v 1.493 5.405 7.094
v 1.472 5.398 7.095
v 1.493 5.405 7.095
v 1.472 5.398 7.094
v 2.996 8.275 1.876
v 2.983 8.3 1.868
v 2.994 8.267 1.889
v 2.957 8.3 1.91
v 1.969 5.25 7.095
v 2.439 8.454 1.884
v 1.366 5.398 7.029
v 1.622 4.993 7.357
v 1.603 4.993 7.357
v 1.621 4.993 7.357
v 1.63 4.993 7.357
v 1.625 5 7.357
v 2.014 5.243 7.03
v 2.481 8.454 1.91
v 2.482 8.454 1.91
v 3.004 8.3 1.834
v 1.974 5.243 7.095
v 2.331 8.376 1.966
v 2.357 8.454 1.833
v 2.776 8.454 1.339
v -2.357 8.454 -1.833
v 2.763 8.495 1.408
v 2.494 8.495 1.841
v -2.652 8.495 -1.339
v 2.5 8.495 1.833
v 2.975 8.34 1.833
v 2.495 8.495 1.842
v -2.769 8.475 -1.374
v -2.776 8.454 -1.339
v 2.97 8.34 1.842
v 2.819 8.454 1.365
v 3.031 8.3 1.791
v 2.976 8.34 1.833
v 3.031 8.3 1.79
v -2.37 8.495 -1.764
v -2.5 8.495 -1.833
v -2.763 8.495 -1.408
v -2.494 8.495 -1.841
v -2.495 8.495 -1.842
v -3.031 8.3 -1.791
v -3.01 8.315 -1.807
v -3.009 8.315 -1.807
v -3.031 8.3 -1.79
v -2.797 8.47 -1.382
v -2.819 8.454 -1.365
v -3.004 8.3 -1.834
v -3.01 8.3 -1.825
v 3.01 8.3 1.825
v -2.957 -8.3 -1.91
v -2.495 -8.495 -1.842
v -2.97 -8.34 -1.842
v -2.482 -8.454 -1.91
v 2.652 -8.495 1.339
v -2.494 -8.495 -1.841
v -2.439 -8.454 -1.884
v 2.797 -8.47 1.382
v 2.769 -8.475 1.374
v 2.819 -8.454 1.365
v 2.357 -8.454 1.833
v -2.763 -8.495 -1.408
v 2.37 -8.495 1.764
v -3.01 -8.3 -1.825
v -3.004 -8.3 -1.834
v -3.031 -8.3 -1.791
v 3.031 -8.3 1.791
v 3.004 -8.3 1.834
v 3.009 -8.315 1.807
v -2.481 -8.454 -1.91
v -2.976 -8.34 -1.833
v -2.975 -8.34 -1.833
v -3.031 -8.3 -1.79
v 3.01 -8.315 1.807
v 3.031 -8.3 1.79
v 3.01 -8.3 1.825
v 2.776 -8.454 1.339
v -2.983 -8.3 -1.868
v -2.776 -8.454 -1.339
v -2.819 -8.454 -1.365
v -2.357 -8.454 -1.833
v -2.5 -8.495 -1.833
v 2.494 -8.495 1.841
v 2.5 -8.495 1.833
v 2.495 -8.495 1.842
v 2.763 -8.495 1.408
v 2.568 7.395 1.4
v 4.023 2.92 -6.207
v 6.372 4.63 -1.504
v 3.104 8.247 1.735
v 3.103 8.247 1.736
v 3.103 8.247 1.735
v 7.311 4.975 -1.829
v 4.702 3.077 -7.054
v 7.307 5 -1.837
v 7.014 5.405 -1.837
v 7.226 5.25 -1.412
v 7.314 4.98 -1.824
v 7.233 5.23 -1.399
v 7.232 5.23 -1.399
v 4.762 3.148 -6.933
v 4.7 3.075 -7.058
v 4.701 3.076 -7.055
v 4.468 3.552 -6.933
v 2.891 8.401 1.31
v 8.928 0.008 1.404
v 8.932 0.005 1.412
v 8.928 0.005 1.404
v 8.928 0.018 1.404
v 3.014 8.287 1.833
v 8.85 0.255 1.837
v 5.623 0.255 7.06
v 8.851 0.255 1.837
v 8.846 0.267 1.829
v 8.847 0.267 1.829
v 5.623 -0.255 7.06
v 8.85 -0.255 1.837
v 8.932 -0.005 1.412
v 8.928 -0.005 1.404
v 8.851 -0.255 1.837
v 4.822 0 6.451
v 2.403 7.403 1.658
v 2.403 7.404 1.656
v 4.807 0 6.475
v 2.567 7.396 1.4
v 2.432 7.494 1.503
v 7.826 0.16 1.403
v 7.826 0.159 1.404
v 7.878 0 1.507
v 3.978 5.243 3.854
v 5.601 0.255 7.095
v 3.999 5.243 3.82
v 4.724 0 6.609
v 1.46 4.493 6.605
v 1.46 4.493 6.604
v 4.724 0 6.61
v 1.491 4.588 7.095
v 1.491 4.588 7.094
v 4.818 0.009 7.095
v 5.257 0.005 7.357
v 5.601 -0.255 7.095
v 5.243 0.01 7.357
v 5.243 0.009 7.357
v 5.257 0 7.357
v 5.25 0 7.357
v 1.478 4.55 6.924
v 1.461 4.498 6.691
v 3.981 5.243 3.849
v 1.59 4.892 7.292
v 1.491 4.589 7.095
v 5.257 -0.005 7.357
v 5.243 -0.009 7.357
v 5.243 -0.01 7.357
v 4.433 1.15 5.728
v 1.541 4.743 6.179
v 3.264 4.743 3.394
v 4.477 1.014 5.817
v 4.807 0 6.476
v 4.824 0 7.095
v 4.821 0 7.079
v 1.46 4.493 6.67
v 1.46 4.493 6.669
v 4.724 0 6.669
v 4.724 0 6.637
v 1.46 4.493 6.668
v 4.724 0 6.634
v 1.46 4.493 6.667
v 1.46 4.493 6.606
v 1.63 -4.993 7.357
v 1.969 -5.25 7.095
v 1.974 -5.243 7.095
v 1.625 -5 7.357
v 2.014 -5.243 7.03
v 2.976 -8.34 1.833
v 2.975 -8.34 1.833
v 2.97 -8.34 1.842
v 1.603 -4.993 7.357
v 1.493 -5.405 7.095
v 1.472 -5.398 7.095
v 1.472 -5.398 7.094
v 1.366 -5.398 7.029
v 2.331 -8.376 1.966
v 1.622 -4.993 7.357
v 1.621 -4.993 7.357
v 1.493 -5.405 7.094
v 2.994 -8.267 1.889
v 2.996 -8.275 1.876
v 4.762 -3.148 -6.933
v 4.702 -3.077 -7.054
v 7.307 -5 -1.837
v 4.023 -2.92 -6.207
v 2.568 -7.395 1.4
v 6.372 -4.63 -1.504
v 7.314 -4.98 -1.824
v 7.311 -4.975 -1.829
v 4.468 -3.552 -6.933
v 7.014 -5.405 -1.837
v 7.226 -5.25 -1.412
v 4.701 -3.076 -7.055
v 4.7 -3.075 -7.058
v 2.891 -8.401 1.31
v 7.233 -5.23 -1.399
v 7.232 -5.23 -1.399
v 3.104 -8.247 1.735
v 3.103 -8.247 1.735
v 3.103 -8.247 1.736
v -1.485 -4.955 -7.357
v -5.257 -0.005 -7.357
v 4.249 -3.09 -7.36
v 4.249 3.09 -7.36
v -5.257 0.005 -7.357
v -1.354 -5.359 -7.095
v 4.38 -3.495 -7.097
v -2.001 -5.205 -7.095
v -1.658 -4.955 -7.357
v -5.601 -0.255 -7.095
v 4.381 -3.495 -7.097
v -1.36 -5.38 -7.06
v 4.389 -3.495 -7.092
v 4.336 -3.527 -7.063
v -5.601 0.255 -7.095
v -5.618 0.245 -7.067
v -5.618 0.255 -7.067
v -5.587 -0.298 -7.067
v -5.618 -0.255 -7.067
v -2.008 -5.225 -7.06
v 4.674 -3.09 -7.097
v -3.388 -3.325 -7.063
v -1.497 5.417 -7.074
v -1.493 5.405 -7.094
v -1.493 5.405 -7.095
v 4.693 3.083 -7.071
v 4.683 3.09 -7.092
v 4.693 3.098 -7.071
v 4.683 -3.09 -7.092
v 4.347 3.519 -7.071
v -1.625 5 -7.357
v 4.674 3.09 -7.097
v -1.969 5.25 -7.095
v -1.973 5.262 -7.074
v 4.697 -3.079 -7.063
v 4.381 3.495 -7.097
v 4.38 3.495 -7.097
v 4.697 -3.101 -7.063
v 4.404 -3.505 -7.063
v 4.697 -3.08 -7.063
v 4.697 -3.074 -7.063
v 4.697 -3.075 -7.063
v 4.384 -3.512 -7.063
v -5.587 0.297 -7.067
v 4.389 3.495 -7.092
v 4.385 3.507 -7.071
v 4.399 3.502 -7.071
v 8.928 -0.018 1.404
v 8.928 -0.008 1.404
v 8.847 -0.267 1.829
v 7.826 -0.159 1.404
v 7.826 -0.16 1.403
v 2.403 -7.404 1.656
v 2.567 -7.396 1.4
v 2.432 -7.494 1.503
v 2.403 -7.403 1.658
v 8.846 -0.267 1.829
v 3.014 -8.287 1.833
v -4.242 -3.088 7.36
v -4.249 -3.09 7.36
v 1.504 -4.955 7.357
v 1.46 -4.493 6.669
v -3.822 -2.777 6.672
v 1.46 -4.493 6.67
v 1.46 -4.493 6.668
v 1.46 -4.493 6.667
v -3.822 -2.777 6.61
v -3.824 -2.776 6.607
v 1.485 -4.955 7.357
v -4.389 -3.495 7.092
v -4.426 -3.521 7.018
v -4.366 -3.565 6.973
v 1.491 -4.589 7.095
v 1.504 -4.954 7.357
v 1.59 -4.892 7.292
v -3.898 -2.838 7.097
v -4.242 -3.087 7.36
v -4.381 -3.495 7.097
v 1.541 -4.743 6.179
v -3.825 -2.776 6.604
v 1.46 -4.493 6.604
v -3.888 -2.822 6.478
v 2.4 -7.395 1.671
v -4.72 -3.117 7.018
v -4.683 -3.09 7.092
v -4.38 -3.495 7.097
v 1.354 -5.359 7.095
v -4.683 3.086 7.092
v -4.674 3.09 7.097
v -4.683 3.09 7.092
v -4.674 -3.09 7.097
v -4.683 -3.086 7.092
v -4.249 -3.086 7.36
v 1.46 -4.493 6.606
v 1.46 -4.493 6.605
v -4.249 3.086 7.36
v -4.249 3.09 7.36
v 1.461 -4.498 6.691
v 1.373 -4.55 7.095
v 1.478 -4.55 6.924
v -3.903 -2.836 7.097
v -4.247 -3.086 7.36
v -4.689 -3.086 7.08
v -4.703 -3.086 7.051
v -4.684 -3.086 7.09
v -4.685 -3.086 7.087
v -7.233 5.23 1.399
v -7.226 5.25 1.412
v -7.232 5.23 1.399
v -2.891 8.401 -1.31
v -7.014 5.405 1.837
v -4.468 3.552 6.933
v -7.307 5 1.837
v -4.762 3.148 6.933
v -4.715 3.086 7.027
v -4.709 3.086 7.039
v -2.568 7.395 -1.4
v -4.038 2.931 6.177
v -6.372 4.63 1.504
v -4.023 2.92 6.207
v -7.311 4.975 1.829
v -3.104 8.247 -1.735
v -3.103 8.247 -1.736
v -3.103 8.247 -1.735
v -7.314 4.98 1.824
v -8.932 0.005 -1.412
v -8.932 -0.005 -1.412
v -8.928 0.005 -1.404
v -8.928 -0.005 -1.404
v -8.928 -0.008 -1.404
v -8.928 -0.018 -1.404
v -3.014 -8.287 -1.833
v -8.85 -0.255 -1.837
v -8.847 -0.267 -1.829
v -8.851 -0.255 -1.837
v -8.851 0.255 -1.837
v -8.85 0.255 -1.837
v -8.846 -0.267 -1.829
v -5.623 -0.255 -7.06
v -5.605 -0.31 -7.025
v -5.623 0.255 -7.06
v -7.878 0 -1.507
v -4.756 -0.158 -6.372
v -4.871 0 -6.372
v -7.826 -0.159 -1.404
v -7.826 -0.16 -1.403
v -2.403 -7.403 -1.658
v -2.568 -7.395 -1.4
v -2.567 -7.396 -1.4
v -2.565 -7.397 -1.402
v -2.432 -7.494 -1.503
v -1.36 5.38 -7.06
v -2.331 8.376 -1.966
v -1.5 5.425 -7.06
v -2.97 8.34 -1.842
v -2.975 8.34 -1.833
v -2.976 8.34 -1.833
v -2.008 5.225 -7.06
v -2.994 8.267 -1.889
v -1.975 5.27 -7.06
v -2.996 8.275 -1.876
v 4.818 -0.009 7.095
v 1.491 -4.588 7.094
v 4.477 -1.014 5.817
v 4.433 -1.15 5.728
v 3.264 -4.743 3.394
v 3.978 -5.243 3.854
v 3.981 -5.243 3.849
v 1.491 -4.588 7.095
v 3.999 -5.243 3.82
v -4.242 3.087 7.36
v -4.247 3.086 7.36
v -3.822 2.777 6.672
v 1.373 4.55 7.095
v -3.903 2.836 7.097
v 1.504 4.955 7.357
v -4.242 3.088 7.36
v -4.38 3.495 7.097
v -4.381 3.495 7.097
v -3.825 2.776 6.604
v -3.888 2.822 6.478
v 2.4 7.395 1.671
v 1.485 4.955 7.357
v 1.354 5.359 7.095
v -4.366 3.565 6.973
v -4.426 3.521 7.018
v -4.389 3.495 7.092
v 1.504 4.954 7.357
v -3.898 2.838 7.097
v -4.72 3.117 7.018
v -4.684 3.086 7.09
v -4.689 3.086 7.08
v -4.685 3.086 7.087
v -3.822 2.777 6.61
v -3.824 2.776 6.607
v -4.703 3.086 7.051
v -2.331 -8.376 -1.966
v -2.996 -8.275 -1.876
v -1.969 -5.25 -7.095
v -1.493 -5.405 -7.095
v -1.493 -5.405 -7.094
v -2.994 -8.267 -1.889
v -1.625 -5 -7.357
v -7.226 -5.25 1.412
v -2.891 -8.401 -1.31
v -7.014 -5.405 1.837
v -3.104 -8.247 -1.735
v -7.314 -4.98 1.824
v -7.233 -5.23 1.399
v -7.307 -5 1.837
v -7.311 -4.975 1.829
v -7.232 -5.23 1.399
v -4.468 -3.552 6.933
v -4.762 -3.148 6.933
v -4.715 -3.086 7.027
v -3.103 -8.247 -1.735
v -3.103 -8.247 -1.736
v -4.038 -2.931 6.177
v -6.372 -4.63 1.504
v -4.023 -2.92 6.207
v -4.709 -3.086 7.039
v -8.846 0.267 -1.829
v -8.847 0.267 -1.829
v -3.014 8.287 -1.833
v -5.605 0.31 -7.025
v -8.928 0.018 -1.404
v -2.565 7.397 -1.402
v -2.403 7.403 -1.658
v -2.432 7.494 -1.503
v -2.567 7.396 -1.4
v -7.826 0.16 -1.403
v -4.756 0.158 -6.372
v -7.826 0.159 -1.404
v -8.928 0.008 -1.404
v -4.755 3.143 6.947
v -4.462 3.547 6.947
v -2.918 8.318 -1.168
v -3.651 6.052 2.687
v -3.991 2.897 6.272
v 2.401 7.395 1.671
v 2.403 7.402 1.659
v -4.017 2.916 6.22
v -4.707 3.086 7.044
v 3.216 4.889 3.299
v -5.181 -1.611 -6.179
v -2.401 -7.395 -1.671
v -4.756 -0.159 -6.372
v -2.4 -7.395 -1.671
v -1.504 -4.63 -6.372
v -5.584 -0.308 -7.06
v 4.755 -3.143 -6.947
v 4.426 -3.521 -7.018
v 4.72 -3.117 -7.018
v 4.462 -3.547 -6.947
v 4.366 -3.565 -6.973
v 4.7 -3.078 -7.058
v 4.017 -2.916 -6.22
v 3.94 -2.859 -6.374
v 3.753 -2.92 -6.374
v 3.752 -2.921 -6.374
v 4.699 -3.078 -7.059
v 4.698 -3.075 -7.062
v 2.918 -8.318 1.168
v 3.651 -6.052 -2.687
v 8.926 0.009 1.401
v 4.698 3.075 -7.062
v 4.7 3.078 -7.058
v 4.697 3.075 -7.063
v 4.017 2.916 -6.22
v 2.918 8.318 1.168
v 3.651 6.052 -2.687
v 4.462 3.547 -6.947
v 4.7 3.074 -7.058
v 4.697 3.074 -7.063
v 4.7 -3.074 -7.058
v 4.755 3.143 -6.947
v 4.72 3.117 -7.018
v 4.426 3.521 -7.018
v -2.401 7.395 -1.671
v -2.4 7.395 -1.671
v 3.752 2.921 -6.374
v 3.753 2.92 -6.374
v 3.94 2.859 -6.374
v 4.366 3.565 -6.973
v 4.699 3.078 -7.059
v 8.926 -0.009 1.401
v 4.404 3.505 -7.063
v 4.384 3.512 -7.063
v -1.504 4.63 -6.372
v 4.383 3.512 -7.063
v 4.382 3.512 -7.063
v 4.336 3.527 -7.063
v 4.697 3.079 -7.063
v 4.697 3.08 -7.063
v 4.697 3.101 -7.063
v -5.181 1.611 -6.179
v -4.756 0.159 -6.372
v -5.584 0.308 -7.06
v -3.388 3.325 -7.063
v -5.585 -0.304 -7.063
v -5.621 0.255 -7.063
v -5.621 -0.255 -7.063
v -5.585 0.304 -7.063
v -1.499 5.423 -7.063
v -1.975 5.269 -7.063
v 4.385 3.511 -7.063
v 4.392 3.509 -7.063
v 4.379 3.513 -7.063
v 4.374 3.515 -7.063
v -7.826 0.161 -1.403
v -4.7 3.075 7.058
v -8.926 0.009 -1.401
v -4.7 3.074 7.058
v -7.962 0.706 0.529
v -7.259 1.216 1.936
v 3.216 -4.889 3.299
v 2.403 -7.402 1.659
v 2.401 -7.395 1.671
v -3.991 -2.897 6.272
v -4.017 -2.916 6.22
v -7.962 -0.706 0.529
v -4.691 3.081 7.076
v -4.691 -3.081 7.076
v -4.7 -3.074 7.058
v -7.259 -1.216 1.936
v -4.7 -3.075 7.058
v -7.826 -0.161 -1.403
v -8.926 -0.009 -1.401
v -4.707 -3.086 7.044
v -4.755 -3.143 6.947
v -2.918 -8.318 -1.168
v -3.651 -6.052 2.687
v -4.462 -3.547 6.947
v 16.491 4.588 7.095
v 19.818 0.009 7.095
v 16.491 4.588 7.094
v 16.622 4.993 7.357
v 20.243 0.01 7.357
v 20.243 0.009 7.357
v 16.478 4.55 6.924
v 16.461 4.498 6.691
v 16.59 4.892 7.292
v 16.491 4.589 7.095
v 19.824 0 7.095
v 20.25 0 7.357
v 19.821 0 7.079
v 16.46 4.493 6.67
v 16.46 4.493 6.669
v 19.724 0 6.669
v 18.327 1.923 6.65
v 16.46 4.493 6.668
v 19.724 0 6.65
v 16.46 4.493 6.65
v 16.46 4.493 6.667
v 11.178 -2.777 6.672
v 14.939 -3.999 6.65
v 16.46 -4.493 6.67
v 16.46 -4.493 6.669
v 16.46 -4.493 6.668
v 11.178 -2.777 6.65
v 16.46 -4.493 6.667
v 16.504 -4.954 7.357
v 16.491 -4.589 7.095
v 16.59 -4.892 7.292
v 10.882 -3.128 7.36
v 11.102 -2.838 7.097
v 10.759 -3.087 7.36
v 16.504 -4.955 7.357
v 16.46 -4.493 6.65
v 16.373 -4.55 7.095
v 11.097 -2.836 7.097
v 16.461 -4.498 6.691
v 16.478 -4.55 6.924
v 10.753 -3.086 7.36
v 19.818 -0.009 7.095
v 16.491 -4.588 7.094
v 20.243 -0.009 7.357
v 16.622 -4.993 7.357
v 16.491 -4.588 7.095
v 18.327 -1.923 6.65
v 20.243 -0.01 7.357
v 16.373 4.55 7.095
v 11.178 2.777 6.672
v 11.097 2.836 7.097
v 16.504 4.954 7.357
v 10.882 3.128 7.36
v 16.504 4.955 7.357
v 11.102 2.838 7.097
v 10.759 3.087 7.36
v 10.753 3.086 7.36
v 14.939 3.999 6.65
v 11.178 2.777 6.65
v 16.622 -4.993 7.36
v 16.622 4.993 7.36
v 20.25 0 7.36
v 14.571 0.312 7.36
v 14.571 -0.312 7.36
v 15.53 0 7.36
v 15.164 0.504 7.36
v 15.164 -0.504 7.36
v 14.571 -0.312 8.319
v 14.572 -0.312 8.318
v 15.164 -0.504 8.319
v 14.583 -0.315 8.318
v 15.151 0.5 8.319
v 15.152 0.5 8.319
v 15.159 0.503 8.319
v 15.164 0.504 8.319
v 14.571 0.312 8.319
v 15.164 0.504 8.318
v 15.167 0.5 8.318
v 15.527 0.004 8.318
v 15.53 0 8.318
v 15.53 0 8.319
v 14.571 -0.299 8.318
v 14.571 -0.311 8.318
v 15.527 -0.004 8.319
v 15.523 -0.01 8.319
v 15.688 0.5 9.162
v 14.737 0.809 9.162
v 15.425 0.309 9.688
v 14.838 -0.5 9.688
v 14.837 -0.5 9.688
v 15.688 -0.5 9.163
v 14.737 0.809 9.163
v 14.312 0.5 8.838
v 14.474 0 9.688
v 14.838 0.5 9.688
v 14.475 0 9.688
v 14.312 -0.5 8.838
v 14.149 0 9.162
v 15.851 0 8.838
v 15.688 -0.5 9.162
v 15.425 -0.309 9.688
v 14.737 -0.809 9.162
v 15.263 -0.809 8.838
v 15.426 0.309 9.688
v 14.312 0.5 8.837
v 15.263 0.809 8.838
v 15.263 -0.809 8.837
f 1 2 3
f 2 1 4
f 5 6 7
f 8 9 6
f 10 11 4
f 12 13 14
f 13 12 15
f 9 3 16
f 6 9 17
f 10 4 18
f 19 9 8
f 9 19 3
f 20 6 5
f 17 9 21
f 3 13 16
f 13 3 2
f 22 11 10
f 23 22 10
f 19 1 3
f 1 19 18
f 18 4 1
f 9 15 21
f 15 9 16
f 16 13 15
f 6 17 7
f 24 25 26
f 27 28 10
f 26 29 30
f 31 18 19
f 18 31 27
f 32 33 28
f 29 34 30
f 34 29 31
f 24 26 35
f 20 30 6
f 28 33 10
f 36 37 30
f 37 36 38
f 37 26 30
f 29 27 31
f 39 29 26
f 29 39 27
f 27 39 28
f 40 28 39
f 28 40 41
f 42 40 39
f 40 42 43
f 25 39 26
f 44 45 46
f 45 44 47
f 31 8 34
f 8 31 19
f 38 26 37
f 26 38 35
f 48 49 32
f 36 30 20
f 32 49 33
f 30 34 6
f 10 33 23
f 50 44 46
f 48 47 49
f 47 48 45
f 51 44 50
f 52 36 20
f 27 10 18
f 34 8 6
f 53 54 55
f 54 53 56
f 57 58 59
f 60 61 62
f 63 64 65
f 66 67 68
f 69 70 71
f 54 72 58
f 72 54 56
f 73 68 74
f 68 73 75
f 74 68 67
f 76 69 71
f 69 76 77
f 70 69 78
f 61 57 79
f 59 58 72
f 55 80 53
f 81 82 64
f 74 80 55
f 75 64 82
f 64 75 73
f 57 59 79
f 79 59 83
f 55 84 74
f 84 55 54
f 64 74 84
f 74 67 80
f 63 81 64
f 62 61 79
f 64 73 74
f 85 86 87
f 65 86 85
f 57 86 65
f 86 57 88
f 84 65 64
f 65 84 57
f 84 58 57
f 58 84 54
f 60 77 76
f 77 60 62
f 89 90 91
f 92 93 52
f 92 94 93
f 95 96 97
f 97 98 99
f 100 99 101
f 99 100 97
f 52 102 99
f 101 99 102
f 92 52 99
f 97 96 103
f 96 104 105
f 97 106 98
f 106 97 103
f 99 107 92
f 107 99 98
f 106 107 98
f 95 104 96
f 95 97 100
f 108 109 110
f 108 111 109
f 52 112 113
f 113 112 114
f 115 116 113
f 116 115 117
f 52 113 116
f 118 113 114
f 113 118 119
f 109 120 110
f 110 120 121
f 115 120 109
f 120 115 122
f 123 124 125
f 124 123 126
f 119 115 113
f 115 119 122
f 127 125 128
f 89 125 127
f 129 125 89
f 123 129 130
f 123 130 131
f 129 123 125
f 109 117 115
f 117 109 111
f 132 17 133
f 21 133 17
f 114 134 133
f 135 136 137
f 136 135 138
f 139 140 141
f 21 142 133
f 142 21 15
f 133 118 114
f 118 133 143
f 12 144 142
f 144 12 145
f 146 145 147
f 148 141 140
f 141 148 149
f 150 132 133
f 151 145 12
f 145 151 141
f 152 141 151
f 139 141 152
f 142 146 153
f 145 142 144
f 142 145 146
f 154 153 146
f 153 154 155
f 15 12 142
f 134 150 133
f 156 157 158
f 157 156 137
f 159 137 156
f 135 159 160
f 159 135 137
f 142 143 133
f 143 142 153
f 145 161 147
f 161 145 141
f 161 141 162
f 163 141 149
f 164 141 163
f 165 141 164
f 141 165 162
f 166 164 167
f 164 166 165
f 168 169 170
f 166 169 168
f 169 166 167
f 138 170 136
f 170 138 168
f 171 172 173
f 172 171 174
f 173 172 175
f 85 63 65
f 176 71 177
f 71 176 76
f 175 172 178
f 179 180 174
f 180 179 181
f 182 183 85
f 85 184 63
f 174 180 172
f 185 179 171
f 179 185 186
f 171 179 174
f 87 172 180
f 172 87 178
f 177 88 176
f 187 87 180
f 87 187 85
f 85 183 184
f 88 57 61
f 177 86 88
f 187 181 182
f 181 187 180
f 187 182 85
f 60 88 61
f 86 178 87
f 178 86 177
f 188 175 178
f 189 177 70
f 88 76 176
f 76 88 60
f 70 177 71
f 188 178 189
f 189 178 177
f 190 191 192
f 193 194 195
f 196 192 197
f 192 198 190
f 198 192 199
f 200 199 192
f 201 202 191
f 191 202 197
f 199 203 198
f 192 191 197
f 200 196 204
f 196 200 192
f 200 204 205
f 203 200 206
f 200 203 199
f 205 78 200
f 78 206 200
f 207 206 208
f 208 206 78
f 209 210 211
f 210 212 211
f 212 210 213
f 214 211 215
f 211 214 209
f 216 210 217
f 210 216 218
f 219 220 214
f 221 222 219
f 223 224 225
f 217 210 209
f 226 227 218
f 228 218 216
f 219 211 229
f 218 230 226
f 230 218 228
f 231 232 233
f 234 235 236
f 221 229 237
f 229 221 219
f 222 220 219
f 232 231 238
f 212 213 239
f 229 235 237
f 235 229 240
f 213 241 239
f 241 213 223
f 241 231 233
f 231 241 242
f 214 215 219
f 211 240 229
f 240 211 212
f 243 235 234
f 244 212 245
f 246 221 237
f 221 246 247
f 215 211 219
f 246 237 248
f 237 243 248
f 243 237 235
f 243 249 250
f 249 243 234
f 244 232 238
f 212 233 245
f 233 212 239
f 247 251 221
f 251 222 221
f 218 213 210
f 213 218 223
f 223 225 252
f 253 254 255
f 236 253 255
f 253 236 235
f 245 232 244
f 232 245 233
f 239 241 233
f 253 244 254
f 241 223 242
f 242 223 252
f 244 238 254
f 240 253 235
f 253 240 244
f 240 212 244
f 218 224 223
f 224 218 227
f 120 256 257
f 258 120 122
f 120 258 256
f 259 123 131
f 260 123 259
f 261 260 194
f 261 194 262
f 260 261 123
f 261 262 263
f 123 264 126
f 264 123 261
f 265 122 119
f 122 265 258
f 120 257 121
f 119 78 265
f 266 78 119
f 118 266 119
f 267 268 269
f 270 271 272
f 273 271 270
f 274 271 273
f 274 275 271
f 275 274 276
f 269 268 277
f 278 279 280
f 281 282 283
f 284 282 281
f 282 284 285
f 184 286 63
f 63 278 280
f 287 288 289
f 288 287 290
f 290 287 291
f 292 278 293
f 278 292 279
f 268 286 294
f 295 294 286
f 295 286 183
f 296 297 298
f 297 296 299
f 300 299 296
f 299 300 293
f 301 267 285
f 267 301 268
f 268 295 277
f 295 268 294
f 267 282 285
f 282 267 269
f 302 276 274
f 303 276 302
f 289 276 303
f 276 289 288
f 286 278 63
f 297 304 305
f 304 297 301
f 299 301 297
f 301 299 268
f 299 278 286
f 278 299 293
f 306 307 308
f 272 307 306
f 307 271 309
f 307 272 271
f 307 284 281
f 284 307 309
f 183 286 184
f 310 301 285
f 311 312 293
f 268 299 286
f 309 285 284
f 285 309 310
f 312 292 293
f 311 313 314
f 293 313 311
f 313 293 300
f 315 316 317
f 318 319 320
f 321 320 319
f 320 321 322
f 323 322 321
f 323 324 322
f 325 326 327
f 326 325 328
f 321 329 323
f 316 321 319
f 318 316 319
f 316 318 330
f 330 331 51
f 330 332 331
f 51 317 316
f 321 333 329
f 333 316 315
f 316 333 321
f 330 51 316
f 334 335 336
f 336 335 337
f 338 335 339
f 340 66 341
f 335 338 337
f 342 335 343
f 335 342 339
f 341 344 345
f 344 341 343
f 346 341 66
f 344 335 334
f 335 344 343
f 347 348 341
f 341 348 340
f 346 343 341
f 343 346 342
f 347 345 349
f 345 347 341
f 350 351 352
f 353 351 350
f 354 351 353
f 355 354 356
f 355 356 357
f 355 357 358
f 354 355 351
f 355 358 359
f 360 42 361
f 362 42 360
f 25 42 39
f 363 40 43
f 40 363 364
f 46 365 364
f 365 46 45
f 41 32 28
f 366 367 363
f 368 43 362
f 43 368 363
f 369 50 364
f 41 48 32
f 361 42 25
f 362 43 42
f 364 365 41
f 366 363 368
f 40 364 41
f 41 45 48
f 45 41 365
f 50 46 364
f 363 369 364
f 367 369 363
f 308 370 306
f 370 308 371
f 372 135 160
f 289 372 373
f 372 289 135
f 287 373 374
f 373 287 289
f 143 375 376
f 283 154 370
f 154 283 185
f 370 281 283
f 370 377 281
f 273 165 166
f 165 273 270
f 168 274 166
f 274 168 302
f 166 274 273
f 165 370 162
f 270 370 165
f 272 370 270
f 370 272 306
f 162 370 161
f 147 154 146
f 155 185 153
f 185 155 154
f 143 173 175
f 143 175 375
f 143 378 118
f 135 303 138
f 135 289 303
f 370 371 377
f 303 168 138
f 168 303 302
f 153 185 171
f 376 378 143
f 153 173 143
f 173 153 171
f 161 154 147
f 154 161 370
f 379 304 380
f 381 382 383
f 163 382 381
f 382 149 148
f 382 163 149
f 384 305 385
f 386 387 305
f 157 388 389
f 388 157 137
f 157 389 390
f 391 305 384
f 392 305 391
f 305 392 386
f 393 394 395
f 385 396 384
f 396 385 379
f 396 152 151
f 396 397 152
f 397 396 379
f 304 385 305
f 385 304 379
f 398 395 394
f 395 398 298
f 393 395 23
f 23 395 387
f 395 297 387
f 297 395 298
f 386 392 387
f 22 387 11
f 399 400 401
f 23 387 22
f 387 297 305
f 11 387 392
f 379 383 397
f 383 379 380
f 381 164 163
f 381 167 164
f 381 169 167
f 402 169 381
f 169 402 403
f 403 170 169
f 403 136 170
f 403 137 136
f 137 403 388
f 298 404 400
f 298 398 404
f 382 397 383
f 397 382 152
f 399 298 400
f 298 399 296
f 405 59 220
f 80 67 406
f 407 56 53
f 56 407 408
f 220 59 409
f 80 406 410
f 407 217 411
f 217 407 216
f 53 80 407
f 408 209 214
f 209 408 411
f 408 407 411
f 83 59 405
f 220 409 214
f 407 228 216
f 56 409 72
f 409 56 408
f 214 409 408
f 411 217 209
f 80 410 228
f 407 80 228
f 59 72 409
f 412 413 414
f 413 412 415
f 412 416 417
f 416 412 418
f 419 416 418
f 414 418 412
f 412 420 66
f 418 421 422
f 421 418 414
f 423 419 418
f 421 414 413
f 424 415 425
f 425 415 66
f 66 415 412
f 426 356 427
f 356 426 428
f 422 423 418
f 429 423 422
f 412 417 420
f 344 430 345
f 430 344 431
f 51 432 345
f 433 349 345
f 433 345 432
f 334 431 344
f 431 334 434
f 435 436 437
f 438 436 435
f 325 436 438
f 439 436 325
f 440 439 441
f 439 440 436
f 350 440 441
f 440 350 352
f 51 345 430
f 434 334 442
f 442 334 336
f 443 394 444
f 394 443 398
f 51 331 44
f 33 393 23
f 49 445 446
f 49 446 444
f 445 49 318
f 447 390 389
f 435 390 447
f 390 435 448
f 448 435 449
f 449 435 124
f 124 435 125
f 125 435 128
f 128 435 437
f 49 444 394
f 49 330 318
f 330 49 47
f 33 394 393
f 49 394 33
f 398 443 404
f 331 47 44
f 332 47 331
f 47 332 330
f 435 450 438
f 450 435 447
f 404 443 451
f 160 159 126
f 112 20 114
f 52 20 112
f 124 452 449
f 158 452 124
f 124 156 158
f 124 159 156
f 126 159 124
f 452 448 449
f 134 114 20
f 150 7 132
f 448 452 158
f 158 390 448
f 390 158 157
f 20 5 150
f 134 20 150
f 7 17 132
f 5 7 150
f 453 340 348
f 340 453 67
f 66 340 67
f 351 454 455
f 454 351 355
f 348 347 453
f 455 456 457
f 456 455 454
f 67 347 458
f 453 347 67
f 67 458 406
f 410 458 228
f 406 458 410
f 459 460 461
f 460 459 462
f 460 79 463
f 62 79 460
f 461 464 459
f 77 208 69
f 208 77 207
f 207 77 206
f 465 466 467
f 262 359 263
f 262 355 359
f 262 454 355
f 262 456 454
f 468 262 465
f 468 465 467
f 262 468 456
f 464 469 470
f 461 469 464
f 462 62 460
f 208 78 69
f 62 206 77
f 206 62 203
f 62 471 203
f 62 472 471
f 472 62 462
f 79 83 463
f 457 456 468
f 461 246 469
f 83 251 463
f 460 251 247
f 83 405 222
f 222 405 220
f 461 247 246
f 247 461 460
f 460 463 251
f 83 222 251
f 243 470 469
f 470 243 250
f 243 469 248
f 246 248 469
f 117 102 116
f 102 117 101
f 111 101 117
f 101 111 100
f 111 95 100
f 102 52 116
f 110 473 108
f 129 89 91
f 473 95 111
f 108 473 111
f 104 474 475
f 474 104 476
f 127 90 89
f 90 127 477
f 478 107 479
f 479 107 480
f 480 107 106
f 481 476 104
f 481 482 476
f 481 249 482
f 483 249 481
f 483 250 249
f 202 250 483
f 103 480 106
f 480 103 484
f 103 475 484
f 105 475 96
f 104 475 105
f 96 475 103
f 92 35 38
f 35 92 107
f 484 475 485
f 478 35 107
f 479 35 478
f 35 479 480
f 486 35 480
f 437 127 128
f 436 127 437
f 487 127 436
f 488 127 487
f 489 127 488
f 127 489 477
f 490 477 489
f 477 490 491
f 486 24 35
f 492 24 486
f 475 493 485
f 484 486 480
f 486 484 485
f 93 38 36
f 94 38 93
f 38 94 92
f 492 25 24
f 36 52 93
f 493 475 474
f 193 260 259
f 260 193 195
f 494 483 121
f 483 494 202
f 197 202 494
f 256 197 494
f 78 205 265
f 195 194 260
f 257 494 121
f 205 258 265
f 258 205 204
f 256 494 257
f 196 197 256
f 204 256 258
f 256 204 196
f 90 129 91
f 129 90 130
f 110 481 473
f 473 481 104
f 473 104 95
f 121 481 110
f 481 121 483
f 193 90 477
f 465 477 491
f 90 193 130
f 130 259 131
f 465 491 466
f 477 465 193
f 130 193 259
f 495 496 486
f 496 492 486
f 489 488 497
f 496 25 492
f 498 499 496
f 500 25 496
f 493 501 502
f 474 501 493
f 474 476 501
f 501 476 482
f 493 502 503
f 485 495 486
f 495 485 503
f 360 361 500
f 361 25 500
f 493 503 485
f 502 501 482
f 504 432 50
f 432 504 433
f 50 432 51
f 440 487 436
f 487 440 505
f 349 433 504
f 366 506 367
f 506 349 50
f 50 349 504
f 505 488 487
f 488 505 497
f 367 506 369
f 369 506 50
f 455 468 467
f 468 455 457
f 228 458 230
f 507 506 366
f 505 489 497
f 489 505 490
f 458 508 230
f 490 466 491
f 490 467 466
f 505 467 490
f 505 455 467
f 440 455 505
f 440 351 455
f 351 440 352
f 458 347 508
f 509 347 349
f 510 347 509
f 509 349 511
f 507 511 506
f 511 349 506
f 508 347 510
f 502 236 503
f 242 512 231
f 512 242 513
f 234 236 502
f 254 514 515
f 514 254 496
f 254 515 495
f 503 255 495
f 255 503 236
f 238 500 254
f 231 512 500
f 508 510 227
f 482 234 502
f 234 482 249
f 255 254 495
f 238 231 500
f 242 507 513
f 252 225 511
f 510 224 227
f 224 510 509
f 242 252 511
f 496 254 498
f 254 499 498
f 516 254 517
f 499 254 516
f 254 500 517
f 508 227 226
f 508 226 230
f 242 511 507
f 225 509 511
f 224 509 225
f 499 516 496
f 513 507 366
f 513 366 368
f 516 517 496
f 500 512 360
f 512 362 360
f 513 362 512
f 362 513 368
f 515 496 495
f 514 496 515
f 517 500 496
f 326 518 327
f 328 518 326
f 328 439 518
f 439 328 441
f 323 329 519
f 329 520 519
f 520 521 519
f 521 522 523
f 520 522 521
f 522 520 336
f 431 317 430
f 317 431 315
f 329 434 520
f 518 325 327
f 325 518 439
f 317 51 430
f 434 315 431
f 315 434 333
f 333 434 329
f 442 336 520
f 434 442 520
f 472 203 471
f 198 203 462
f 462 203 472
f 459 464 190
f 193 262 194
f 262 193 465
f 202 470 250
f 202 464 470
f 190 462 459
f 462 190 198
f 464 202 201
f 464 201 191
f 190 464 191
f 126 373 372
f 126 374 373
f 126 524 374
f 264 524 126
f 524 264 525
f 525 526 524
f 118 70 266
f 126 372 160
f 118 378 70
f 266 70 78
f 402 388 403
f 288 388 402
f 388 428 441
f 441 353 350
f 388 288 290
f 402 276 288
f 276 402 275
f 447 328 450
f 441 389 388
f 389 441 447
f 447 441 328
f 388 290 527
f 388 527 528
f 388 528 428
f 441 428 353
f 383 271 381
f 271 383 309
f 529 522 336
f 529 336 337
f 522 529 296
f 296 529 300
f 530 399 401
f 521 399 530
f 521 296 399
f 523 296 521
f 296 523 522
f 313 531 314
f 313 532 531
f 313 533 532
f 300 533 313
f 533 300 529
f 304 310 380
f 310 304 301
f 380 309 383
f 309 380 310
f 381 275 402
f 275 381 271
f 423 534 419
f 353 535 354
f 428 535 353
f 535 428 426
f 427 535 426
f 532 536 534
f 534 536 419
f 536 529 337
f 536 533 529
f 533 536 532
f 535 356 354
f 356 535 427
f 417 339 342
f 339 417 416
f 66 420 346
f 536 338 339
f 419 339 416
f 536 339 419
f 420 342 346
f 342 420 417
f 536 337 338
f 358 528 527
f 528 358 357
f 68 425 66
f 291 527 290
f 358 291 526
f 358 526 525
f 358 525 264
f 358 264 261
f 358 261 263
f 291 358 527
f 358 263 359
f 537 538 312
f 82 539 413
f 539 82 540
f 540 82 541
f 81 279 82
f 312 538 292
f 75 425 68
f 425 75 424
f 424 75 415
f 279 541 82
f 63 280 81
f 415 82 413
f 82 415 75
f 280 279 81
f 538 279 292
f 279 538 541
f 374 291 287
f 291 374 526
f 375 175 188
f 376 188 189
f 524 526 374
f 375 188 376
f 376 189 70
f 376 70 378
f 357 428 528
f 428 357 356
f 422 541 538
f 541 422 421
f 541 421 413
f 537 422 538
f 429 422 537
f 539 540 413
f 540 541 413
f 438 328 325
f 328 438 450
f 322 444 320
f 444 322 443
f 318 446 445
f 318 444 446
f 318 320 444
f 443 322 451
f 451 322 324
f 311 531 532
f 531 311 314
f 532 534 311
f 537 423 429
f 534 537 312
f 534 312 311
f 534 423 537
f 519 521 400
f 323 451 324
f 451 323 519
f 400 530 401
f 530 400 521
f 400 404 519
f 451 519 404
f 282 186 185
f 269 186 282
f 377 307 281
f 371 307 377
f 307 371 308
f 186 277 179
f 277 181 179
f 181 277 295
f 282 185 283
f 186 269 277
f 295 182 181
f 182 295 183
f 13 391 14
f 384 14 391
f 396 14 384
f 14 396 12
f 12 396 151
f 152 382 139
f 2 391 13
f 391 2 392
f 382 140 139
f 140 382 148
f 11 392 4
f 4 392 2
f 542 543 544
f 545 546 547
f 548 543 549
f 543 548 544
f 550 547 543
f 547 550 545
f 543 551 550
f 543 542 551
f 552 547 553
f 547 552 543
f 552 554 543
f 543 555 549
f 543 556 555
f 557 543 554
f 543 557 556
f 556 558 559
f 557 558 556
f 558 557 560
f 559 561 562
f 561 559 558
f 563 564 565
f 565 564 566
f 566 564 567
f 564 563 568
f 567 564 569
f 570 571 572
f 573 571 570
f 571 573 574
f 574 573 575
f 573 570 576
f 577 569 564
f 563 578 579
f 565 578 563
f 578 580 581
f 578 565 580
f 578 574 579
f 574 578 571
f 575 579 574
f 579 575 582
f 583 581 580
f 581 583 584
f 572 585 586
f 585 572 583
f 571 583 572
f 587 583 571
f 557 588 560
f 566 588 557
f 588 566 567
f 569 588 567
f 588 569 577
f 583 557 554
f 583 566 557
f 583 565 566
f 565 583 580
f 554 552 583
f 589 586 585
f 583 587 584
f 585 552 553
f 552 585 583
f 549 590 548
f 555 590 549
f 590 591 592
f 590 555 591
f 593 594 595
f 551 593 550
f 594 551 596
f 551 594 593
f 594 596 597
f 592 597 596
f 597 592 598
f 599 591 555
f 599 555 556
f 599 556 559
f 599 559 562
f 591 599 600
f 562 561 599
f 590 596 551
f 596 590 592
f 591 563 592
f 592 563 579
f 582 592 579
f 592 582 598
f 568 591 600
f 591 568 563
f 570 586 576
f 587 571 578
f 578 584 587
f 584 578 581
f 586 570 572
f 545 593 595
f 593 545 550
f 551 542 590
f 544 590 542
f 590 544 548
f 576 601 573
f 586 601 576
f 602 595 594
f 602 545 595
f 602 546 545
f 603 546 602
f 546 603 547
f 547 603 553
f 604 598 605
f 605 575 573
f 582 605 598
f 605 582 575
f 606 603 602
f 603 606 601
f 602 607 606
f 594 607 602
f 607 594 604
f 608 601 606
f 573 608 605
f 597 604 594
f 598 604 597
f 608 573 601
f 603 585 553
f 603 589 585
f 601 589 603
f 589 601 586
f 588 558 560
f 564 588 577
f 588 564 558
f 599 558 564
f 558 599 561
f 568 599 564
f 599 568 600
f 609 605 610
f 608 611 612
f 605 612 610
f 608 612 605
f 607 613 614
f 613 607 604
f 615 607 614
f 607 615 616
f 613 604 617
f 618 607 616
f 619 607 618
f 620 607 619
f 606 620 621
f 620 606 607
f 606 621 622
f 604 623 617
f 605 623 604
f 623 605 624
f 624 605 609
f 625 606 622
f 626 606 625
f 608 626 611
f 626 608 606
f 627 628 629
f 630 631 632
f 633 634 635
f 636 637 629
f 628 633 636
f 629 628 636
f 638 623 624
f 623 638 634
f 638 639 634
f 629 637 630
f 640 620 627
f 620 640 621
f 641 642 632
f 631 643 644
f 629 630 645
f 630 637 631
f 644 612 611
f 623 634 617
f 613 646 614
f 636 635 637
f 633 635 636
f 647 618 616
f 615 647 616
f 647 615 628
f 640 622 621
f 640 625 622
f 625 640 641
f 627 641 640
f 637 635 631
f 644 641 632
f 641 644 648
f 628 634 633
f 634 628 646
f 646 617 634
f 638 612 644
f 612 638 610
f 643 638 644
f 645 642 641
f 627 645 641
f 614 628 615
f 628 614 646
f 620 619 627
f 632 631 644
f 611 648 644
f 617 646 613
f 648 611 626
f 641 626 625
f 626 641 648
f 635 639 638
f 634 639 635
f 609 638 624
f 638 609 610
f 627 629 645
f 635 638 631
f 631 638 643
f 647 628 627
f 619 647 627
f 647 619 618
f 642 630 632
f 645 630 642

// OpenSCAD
// Draws a polyhedron by its cartesian coordinates (simplified;
// all elements are assumed ±x).
module polyh(points) {
    // OpenSCAD can't draw zero widths, so, we have to make zeros an epsilon larger
    e = 0.001;
    function nonzerofy(xs) = [for (x = xs) x == 0 ? e : x];

    // Draw cubes and then take a convex hull of them
    // Rotate so that flat surface is down, easing printing etc.
    rotate([0,atan(phi),0]) hull() {
        for(p = points) {
            cube(nonzerofy(p), center=true);
        }
    }
}

phi = (1 + sqrt(5))/2;

module iko() {
    polyh([
        [0,1,phi],
        [1,phi,0],
        [phi,0,1]
    ]);
}

module dode() {
    polyh([
        [1, 1, 1],
        [0, phi, 1/phi],
        [1/phi, 0, phi],
        [phi, 1/phi, 0]
    ]);
}

// https://en.wikipedia.org/wiki/Compound_of_dodecahedron_and_icosahedron
module mollukka () {
    minkowski() {
        difference() {
            scale(10) dode();
            scale(9.95) dode();
            // Open top
            cylinder(10, r=5.25, $fn=5);
        }
        scale(0.5) iko();
    }
}

module kansi() {
    difference() {
        translate([0,0,6.65]) cylinder(0.71, r=5.25, $fn=5);
        mollukka();
    }
    translate([0,0,6.65]) cylinder(2, r=0.53, $fn=5);
    translate([0,0,9]) rotate([0,0,36]) dode();
}

mollukka();
translate([15,0,0]) kansi();
